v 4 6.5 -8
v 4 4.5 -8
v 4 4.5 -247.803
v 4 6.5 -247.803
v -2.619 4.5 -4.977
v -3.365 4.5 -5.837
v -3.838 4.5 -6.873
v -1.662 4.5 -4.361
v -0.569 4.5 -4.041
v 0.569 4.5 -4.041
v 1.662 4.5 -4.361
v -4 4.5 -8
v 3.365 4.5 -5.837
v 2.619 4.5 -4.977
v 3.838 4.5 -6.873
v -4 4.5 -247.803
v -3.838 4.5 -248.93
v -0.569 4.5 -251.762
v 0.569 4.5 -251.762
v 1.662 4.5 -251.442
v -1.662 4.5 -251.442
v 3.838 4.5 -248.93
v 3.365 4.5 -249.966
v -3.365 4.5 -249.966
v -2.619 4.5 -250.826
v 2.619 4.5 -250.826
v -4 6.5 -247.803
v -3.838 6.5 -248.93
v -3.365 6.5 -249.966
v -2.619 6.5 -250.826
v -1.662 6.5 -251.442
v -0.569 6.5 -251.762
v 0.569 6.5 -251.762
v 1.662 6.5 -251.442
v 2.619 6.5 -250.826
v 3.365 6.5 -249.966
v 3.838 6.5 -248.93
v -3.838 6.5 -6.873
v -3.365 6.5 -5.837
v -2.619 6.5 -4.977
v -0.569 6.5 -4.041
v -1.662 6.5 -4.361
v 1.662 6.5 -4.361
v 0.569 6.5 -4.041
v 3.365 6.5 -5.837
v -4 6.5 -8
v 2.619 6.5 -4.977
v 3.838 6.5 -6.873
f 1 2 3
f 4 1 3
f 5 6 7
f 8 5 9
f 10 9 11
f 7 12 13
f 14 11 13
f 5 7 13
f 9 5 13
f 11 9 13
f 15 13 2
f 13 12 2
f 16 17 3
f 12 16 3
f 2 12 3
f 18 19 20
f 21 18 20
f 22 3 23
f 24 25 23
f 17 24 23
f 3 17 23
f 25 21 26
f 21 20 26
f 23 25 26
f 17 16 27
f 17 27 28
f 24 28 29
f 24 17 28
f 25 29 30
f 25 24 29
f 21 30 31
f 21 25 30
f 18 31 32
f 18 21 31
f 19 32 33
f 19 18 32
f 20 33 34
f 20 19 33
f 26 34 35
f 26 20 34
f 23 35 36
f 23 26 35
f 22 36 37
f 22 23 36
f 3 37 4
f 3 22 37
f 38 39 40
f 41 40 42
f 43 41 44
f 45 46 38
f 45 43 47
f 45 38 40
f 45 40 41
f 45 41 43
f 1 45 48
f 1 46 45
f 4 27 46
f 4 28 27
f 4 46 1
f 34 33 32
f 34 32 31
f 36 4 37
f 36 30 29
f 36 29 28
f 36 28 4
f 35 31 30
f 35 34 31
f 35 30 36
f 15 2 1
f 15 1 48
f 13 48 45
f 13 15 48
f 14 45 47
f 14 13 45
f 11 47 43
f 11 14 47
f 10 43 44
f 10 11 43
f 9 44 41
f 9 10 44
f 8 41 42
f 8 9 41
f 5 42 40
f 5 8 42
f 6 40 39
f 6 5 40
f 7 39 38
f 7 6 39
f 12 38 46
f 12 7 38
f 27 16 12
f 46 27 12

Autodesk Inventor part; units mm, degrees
ref_plane "YZ Plane" through (0, 0, 0) normal (1, 0, 0) x (0, 1, 0)
ref_plane "XZ Plane" through (0, 0, 0) normal (0, 1, 0) x (-1, 0, 0)
ref_plane "XY Plane" through (0, 0, 0) normal (0, 0, 1) x (1, 0, 0)
sketch "Sketch1" plane through (0, 0, 0) normal (0, 1, 0) x (-1, 0, 0)
  line L0 (0, 0) -> (0, -263.803) construction
  line L1 (-4, 0) -> (-4, -263.803)
  line L2 (4, -263.803) -> (4, 0)
  arc A0 (4, 0) -> (-4, 0) centre (0, 0) ccw
  arc A1 (-4, -263.803) -> (4, -263.803) centre (0, -263.803) ccw
  circle A2 centre (0, 0) radius 1.5
  circle A3 centre (0, -263.803) radius 1.5
  point P0 (0, -131.9015)
  dimension "d0" = 263.803
  dimension "d1" = 8
  dimension "d2" = 3
  dimension "d3" = 3
extrude "Extrusion1" add sketch "Sketch1" along normal blind 4.5
sketch "Sketch2" plane through (0, 4.5, 0) normal (0, 1, 0) x (1, 0, 0)
  line L0 (0, 8) -> (0, 247.803) construction
  line L1 (4, 8) -> (4, 247.803)
  line L2 (-4, 247.803) -> (-4, 8)
  arc A0 (-4, 8) -> (4, 8) centre (0, 8) ccw
  arc A1 (4, 247.803) -> (-4, 247.803) centre (0, 247.803) ccw
  arc A2 (4, 263.803) -> (-4, 263.803) centre (0, 263.803) ccw projected
  line L3 (-4, 263.803) -> (-4, 0) projected
  arc A3 (-4, 0) -> (4, 0) centre (0, 0) ccw projected
  line L4 (4, 0) -> (4, 263.803) projected
  circle A4 centre (0, 263.803) radius 1.5 projected
  circle A5 centre (0, 0) radius 1.5 projected
  point P0 (0, 127.9015)
  point P1 (-4, 8)
  dimension "d6" = 8
  dimension "d7" = 16
  dimension "d8" = 8
extrude "Extrusion2" add sketch "Sketch2" along normal blind 2 contours A0 L2 A1 L1
extrude "Extrusion3" cut sketch "Sketch2" against normal blind 100
sketch "Sketch3" plane through (0, 6.5, 0) normal (0, 1, 0) x (1, 0, 0)
  line L0 (4, 8) -> (4, 247.803) projected
  line L1 (-4, 247.803) -> (-4, 8) projected
  arc A0 (-4, 8) -> (4, 8) centre (0, 8) ccw projected
  line L2 (4, 8) -> (4, 247.803) projected
  arc A1 (4, 247.803) -> (-4, 247.803) centre (0, 247.803) ccw projected
  point P0 (0, 0)
properties part number "Wing_arm_3_reinforcement"
